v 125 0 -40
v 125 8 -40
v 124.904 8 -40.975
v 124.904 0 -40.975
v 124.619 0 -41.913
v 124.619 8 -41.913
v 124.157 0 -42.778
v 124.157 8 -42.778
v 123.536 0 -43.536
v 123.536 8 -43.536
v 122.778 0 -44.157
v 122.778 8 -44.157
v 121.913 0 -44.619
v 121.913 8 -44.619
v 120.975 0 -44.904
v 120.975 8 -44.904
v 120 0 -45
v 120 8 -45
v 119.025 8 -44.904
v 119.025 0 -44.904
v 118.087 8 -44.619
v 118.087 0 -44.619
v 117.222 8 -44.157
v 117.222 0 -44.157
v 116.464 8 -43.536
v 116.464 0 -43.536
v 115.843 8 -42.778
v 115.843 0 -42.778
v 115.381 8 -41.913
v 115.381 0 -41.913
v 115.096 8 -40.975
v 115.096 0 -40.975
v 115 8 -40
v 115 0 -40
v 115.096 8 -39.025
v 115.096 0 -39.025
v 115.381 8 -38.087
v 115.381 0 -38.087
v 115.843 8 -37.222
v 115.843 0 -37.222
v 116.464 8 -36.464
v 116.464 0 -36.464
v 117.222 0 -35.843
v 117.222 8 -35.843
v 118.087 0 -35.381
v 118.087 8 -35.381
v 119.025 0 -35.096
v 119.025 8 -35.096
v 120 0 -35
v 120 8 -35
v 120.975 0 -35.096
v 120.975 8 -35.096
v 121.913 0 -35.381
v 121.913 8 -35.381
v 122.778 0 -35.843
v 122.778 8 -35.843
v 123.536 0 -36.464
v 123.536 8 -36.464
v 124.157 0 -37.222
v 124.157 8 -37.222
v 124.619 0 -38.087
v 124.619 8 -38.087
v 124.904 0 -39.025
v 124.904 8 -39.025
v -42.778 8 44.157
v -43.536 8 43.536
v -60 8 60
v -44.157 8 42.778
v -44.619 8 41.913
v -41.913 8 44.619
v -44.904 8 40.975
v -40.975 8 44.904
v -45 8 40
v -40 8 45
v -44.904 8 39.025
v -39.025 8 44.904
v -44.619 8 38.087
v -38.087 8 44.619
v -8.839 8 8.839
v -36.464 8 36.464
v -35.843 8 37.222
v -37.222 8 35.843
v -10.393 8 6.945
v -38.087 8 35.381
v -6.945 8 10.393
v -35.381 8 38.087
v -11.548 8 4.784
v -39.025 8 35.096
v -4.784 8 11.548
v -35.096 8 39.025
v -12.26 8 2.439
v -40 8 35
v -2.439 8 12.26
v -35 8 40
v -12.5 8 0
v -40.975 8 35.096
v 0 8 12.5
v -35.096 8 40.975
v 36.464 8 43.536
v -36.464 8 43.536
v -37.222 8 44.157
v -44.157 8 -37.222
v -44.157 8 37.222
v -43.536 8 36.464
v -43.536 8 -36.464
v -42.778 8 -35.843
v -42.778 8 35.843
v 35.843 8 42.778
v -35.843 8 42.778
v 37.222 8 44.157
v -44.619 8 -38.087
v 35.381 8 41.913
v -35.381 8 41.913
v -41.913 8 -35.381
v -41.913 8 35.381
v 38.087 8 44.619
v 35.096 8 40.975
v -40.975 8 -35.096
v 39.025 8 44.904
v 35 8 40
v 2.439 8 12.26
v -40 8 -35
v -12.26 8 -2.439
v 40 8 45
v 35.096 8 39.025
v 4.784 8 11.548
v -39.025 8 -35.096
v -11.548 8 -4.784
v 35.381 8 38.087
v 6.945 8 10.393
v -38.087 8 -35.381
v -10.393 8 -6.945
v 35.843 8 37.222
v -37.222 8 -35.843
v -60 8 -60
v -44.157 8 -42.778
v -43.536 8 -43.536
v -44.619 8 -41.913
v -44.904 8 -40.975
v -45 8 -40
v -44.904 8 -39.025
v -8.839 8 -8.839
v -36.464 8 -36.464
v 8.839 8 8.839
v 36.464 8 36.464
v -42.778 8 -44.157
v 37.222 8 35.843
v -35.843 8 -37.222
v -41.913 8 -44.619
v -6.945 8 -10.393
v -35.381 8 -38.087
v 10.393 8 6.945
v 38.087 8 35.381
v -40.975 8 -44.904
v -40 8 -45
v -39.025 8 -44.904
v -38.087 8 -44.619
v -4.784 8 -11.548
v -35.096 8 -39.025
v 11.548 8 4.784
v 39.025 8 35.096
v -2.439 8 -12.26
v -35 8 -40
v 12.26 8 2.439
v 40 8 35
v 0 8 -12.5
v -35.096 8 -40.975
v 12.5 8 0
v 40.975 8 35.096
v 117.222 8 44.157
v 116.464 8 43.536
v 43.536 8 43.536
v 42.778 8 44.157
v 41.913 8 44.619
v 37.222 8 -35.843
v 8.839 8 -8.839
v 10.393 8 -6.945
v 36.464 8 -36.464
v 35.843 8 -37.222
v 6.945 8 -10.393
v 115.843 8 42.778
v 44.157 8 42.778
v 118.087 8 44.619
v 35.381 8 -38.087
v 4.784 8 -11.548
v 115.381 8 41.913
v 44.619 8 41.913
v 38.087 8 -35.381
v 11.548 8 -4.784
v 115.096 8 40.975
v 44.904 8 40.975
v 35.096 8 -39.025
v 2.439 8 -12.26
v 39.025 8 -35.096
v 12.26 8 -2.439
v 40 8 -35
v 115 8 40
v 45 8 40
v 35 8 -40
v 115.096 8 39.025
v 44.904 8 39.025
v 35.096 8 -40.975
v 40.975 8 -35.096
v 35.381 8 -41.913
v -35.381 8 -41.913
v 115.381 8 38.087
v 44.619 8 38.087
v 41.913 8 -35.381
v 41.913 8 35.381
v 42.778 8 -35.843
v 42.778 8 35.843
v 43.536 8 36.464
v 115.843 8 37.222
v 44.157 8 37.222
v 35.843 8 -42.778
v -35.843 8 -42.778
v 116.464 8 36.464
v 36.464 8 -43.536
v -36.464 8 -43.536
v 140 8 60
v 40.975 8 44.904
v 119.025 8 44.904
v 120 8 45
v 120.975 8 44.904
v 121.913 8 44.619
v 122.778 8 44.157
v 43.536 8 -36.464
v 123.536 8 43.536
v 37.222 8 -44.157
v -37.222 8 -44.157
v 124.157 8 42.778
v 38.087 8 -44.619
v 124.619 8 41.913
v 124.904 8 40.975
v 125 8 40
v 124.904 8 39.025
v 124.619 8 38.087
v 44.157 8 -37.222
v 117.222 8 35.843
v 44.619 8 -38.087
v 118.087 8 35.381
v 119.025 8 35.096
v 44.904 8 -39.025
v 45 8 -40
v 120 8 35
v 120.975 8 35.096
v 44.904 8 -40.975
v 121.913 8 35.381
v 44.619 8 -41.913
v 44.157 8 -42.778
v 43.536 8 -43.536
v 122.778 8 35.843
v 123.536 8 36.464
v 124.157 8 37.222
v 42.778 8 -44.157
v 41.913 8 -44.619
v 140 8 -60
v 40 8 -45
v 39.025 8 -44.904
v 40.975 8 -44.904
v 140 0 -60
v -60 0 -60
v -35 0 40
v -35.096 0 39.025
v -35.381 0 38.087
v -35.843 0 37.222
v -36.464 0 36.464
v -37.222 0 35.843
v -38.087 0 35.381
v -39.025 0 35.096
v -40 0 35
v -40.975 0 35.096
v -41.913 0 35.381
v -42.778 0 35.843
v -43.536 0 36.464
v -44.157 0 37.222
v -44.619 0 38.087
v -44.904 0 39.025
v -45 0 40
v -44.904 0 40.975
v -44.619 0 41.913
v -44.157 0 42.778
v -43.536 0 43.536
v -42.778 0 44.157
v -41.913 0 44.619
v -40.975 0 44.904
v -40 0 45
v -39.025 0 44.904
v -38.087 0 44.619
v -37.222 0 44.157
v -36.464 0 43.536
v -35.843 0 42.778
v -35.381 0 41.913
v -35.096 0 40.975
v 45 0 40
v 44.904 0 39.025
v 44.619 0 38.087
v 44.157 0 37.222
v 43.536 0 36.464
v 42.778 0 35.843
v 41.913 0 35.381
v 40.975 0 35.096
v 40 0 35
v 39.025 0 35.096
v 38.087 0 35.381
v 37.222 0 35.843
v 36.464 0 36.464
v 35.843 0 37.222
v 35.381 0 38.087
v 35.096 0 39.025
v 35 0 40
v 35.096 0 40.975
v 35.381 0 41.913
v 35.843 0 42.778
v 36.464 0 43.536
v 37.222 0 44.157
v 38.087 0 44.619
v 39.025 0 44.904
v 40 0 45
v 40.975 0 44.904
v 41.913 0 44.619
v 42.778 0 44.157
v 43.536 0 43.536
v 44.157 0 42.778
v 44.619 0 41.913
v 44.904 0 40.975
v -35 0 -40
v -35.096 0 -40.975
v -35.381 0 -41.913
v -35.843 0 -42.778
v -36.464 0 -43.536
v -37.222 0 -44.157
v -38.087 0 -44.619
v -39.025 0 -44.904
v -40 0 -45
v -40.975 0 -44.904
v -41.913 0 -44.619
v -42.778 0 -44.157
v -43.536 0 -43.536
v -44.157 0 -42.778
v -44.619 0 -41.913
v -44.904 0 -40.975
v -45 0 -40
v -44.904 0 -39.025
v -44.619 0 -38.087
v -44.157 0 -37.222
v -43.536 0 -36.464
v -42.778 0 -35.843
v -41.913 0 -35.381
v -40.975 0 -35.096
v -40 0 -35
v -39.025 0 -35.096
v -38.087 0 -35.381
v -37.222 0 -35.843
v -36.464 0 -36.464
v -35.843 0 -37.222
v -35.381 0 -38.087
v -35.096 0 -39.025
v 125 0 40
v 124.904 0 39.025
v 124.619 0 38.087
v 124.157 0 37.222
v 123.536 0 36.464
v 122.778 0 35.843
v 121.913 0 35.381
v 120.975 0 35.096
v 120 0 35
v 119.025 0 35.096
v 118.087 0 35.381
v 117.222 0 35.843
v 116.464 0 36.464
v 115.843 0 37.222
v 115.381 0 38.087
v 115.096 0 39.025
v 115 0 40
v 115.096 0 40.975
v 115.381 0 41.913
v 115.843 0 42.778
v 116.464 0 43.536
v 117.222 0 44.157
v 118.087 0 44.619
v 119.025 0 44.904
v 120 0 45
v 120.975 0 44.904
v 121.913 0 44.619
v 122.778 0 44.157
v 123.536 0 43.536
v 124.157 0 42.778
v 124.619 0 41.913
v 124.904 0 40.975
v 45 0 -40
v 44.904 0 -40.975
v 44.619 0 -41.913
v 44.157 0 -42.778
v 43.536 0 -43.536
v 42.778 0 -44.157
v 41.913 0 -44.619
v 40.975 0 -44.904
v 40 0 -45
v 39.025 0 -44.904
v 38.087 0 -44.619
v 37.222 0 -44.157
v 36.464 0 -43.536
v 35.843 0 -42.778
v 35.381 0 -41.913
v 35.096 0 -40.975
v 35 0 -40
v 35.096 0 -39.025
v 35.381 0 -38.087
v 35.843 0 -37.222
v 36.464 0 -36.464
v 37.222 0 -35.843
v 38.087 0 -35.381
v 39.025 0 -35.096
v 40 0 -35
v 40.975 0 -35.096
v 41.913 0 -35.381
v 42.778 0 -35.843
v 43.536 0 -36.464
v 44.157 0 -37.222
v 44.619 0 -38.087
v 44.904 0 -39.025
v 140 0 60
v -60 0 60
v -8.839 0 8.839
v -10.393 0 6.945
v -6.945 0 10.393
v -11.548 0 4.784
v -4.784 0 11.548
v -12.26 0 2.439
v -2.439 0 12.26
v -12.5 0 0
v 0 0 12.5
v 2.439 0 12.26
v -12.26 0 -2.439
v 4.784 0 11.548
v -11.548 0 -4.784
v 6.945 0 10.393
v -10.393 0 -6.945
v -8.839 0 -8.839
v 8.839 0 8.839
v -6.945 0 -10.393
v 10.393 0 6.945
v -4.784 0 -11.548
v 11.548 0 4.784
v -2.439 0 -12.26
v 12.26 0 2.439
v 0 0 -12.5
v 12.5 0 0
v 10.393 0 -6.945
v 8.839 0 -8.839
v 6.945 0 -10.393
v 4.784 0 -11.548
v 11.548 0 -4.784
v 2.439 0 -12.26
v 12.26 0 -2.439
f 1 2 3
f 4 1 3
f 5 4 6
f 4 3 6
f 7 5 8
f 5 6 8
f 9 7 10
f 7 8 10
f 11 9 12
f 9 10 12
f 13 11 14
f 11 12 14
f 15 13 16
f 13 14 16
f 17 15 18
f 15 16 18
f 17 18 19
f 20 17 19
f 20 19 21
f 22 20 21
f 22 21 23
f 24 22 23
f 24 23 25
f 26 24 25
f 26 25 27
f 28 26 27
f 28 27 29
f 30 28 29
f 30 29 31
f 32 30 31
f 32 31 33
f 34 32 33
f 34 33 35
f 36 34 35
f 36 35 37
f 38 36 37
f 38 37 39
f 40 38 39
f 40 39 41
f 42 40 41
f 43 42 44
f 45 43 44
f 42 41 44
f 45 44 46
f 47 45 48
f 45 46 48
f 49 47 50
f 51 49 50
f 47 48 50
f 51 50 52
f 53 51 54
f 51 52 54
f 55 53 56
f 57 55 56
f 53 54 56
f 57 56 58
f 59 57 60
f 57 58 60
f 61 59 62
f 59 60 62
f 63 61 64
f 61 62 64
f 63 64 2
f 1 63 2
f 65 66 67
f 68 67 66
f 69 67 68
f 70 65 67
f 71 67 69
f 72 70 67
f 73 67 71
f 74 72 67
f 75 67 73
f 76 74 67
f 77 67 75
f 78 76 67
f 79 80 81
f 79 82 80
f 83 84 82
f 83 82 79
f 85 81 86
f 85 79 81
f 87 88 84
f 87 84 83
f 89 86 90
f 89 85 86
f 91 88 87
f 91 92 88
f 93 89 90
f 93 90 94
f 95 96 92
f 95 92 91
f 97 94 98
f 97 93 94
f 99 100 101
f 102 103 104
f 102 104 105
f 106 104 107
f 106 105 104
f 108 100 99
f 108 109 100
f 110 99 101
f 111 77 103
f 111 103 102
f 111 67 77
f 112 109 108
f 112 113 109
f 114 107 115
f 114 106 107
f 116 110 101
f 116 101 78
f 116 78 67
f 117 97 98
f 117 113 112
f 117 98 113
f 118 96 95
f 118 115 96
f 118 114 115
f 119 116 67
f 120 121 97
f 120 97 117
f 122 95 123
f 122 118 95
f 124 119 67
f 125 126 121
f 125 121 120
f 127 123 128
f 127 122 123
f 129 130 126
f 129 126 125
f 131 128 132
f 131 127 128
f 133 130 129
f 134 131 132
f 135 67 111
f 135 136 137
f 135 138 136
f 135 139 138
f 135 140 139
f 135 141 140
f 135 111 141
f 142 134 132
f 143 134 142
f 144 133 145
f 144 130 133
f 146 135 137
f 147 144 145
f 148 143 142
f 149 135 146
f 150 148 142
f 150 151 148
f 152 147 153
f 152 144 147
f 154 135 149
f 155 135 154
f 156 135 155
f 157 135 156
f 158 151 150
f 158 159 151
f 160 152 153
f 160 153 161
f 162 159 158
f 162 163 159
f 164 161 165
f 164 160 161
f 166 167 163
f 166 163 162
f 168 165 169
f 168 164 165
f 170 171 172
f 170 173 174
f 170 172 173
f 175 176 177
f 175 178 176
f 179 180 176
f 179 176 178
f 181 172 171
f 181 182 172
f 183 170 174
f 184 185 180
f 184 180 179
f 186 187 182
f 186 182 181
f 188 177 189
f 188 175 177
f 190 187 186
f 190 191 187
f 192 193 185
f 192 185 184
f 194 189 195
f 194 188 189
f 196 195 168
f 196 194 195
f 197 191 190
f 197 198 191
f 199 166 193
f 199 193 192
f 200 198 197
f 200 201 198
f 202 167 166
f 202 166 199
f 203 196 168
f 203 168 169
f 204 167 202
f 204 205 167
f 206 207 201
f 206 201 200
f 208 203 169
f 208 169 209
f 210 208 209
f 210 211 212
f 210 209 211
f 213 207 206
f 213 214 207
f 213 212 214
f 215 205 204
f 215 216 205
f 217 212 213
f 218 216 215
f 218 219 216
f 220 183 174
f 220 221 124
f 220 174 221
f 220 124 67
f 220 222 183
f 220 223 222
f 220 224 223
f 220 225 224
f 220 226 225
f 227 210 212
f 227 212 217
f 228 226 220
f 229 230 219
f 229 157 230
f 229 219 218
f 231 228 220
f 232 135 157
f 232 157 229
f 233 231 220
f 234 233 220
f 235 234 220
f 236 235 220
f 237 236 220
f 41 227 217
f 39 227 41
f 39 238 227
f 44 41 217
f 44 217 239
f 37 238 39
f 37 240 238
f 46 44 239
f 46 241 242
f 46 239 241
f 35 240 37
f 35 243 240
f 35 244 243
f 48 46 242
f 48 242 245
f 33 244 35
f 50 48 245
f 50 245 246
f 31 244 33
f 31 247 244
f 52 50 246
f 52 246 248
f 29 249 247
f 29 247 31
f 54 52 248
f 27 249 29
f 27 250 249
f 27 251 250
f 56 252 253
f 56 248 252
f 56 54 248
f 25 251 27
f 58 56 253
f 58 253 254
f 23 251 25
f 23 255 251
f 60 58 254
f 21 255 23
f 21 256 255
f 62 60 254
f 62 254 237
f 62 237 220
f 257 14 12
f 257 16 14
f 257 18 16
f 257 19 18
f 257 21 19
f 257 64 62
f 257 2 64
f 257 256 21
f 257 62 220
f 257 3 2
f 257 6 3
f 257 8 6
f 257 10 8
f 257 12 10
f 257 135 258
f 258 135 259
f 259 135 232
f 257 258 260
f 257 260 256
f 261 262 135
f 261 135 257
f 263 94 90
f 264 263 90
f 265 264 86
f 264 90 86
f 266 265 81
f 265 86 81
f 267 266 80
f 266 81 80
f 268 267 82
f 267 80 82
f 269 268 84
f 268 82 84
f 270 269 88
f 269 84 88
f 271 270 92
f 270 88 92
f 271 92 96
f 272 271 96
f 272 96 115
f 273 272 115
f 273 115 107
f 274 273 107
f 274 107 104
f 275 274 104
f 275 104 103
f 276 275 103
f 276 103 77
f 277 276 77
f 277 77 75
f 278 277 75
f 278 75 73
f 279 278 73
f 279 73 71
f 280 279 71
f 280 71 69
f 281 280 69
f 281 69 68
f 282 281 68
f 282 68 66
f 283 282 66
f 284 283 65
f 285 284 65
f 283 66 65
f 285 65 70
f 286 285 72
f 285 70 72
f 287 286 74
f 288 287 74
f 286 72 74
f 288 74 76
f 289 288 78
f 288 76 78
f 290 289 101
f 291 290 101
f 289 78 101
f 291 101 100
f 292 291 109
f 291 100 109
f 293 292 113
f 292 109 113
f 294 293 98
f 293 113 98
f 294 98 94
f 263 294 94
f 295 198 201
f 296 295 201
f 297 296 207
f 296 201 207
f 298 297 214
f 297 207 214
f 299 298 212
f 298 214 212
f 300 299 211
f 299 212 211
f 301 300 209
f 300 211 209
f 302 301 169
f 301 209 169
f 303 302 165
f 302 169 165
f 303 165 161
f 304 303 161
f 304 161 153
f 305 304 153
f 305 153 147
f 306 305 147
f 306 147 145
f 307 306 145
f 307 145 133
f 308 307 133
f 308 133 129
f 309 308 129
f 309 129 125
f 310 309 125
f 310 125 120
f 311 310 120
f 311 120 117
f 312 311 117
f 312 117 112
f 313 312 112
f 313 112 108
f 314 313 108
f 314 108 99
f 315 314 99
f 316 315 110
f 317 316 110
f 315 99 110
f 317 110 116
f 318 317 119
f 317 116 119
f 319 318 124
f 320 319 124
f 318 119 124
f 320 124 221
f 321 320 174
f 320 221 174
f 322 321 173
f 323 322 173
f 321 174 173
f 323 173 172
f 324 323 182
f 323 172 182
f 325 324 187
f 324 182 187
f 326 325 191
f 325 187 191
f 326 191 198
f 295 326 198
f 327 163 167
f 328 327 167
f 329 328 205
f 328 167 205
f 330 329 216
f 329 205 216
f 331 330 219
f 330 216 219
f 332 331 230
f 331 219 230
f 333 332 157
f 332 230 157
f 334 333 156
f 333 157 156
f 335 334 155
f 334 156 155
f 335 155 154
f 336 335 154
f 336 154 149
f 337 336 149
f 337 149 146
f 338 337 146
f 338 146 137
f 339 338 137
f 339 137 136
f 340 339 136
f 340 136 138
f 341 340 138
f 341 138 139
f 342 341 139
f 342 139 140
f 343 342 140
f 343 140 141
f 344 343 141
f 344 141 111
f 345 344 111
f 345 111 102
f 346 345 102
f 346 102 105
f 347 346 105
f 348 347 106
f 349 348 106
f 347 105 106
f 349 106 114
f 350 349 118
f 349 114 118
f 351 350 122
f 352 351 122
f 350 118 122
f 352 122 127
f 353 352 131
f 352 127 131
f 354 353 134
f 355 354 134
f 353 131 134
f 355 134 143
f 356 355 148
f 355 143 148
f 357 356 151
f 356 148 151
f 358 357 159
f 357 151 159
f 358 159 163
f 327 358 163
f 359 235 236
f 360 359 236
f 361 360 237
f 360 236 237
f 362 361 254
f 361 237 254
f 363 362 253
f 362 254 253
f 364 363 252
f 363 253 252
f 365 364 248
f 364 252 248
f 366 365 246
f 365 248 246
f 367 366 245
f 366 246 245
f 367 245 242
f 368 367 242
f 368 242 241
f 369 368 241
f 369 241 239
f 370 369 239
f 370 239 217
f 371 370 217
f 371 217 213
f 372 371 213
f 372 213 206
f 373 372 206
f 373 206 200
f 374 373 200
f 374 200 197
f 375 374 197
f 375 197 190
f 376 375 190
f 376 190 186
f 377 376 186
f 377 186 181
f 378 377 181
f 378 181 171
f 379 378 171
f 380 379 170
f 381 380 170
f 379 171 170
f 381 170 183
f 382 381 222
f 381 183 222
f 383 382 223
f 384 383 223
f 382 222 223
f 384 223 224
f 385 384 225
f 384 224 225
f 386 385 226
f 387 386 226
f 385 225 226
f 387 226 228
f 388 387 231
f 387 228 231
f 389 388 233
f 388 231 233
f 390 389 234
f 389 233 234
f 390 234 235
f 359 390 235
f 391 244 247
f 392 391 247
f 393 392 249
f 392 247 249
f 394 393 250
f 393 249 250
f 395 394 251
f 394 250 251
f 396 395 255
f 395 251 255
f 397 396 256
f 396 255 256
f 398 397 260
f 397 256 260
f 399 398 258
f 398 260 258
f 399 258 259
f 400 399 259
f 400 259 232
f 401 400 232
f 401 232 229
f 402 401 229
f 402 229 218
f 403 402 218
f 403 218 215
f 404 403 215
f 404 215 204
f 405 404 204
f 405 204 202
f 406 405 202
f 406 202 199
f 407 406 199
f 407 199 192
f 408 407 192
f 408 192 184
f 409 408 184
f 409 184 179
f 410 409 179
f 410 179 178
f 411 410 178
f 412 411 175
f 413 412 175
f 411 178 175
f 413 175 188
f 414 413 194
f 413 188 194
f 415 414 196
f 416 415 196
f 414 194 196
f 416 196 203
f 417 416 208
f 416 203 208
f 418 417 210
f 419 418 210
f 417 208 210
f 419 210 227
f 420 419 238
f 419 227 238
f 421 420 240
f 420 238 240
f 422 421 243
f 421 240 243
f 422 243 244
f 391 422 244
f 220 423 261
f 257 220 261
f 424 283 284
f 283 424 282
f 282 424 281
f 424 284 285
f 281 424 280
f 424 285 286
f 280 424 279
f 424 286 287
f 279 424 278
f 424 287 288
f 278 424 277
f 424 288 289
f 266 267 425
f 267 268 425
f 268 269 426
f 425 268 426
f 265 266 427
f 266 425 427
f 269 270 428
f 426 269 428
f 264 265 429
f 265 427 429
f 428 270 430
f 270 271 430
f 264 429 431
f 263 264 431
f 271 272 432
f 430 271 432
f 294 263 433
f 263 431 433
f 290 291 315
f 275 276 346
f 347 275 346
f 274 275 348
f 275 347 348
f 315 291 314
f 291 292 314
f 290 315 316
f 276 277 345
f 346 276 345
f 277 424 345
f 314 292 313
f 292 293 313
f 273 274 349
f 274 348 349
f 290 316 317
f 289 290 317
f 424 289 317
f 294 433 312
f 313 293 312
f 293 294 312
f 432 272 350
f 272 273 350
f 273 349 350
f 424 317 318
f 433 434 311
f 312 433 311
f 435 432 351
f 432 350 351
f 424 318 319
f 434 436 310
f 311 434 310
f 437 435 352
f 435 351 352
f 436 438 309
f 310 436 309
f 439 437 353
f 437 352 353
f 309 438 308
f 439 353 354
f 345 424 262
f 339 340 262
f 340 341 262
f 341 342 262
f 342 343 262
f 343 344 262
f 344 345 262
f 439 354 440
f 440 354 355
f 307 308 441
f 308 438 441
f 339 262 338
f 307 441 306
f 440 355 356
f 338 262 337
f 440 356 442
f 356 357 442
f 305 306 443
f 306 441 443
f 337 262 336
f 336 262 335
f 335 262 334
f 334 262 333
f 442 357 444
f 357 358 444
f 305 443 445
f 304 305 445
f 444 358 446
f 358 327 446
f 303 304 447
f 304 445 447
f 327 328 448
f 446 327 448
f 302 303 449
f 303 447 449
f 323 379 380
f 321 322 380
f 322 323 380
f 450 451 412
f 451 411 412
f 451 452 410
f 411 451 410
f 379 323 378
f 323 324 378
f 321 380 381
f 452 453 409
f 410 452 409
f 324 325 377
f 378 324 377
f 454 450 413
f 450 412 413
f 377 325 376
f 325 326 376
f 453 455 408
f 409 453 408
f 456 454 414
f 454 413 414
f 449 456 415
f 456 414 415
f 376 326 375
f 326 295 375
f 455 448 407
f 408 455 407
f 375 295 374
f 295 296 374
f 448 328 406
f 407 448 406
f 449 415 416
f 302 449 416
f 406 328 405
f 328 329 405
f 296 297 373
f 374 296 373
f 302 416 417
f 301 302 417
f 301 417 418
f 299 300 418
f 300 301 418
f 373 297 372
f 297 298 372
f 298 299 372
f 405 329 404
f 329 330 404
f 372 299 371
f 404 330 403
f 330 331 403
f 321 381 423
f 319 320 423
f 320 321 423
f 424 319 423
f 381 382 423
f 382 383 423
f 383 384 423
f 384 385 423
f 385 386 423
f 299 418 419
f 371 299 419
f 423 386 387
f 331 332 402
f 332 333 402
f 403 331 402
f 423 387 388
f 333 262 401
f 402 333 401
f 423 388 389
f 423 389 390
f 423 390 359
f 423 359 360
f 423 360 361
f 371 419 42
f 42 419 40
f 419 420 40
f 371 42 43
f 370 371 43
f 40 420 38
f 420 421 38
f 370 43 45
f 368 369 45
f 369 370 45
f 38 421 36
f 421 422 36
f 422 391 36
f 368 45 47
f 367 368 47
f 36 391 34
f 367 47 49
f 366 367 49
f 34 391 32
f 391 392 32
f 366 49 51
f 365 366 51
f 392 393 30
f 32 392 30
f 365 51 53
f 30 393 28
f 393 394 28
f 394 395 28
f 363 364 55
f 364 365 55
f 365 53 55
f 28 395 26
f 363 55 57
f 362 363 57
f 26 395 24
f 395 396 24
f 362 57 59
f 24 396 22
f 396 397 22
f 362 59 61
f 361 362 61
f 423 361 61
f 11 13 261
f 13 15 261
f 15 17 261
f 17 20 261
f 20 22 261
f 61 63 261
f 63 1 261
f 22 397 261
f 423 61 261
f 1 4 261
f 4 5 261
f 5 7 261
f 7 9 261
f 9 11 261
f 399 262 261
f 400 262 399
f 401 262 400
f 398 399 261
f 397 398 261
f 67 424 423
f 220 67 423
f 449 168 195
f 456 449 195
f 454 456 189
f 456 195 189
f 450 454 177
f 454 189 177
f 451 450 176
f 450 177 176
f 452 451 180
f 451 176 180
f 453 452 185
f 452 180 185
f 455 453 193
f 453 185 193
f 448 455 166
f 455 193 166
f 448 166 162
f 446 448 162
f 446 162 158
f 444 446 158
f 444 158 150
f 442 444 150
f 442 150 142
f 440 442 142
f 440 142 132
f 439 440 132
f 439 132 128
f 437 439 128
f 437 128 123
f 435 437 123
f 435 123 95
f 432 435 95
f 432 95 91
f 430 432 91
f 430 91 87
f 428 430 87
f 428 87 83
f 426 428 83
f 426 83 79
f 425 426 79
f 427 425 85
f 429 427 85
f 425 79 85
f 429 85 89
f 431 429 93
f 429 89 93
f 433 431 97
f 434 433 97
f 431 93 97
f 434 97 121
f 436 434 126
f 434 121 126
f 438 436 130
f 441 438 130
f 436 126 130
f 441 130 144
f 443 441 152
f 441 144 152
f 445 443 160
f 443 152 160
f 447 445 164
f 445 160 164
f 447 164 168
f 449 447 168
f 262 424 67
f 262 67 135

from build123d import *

# Parameters (mm, degrees)
SKETCH2_W            = 200
SKETCH2_H            = 120
BOSS_EXTRUDE3_DEPTH  = 8
SKETCH3_R            = 5
CUT_EXTRUDE1_DEPTH   = 9
LPATTERN2_COUNT      = 2
LPATTERN2_PITCH      = 80
LPATTERN2_COUNT_DIR2 = 3
LPATTERN2_PITCH_DIR2 = 80
SKETCH4_R            = 12.5
CUT_EXTRUDE2_DEPTH   = 10


with BuildPart() as part:
    # Sketch2 → Boss-Extrude3 (new body)
    with BuildSketch(Plane(origin=(0, 0, 0), x_dir=(1, 0, 0), z_dir=(0, 1, 0))):
        with Locations((40, 0)):
            Rectangle(SKETCH2_W, SKETCH2_H)
    extrude(amount=BOSS_EXTRUDE3_DEPTH)

    # Sketch3 → Cut-Extrude1 (cut, through all)
    with BuildSketch(Plane(origin=(0, 8, 0), x_dir=(1, 0, 0), z_dir=(0, 1, 0))):
        with Locations((-40, 40)):
            Circle(SKETCH3_R)
    cut_extrude1 = extrude(amount=-CUT_EXTRUDE1_DEPTH, mode=Mode.SUBTRACT)

    # LPattern2: Cut-Extrude1 2 × 3
    with Locations(*[(j * LPATTERN2_PITCH_DIR2, 0, i * LPATTERN2_PITCH) for i in range(LPATTERN2_COUNT) for j in range(LPATTERN2_COUNT_DIR2) if (i, j) != (0, 0)]):
        add(cut_extrude1, mode=Mode.SUBTRACT)

    # Sketch4 → Cut-Extrude2 (cut)
    with BuildSketch(Plane(origin=(0, 8, 0), x_dir=(1, 0, 0), z_dir=(0, 1, 0))):
        Circle(SKETCH4_R)
    extrude(amount=-CUT_EXTRUDE2_DEPTH, mode=Mode.SUBTRACT)


solid = part.part
